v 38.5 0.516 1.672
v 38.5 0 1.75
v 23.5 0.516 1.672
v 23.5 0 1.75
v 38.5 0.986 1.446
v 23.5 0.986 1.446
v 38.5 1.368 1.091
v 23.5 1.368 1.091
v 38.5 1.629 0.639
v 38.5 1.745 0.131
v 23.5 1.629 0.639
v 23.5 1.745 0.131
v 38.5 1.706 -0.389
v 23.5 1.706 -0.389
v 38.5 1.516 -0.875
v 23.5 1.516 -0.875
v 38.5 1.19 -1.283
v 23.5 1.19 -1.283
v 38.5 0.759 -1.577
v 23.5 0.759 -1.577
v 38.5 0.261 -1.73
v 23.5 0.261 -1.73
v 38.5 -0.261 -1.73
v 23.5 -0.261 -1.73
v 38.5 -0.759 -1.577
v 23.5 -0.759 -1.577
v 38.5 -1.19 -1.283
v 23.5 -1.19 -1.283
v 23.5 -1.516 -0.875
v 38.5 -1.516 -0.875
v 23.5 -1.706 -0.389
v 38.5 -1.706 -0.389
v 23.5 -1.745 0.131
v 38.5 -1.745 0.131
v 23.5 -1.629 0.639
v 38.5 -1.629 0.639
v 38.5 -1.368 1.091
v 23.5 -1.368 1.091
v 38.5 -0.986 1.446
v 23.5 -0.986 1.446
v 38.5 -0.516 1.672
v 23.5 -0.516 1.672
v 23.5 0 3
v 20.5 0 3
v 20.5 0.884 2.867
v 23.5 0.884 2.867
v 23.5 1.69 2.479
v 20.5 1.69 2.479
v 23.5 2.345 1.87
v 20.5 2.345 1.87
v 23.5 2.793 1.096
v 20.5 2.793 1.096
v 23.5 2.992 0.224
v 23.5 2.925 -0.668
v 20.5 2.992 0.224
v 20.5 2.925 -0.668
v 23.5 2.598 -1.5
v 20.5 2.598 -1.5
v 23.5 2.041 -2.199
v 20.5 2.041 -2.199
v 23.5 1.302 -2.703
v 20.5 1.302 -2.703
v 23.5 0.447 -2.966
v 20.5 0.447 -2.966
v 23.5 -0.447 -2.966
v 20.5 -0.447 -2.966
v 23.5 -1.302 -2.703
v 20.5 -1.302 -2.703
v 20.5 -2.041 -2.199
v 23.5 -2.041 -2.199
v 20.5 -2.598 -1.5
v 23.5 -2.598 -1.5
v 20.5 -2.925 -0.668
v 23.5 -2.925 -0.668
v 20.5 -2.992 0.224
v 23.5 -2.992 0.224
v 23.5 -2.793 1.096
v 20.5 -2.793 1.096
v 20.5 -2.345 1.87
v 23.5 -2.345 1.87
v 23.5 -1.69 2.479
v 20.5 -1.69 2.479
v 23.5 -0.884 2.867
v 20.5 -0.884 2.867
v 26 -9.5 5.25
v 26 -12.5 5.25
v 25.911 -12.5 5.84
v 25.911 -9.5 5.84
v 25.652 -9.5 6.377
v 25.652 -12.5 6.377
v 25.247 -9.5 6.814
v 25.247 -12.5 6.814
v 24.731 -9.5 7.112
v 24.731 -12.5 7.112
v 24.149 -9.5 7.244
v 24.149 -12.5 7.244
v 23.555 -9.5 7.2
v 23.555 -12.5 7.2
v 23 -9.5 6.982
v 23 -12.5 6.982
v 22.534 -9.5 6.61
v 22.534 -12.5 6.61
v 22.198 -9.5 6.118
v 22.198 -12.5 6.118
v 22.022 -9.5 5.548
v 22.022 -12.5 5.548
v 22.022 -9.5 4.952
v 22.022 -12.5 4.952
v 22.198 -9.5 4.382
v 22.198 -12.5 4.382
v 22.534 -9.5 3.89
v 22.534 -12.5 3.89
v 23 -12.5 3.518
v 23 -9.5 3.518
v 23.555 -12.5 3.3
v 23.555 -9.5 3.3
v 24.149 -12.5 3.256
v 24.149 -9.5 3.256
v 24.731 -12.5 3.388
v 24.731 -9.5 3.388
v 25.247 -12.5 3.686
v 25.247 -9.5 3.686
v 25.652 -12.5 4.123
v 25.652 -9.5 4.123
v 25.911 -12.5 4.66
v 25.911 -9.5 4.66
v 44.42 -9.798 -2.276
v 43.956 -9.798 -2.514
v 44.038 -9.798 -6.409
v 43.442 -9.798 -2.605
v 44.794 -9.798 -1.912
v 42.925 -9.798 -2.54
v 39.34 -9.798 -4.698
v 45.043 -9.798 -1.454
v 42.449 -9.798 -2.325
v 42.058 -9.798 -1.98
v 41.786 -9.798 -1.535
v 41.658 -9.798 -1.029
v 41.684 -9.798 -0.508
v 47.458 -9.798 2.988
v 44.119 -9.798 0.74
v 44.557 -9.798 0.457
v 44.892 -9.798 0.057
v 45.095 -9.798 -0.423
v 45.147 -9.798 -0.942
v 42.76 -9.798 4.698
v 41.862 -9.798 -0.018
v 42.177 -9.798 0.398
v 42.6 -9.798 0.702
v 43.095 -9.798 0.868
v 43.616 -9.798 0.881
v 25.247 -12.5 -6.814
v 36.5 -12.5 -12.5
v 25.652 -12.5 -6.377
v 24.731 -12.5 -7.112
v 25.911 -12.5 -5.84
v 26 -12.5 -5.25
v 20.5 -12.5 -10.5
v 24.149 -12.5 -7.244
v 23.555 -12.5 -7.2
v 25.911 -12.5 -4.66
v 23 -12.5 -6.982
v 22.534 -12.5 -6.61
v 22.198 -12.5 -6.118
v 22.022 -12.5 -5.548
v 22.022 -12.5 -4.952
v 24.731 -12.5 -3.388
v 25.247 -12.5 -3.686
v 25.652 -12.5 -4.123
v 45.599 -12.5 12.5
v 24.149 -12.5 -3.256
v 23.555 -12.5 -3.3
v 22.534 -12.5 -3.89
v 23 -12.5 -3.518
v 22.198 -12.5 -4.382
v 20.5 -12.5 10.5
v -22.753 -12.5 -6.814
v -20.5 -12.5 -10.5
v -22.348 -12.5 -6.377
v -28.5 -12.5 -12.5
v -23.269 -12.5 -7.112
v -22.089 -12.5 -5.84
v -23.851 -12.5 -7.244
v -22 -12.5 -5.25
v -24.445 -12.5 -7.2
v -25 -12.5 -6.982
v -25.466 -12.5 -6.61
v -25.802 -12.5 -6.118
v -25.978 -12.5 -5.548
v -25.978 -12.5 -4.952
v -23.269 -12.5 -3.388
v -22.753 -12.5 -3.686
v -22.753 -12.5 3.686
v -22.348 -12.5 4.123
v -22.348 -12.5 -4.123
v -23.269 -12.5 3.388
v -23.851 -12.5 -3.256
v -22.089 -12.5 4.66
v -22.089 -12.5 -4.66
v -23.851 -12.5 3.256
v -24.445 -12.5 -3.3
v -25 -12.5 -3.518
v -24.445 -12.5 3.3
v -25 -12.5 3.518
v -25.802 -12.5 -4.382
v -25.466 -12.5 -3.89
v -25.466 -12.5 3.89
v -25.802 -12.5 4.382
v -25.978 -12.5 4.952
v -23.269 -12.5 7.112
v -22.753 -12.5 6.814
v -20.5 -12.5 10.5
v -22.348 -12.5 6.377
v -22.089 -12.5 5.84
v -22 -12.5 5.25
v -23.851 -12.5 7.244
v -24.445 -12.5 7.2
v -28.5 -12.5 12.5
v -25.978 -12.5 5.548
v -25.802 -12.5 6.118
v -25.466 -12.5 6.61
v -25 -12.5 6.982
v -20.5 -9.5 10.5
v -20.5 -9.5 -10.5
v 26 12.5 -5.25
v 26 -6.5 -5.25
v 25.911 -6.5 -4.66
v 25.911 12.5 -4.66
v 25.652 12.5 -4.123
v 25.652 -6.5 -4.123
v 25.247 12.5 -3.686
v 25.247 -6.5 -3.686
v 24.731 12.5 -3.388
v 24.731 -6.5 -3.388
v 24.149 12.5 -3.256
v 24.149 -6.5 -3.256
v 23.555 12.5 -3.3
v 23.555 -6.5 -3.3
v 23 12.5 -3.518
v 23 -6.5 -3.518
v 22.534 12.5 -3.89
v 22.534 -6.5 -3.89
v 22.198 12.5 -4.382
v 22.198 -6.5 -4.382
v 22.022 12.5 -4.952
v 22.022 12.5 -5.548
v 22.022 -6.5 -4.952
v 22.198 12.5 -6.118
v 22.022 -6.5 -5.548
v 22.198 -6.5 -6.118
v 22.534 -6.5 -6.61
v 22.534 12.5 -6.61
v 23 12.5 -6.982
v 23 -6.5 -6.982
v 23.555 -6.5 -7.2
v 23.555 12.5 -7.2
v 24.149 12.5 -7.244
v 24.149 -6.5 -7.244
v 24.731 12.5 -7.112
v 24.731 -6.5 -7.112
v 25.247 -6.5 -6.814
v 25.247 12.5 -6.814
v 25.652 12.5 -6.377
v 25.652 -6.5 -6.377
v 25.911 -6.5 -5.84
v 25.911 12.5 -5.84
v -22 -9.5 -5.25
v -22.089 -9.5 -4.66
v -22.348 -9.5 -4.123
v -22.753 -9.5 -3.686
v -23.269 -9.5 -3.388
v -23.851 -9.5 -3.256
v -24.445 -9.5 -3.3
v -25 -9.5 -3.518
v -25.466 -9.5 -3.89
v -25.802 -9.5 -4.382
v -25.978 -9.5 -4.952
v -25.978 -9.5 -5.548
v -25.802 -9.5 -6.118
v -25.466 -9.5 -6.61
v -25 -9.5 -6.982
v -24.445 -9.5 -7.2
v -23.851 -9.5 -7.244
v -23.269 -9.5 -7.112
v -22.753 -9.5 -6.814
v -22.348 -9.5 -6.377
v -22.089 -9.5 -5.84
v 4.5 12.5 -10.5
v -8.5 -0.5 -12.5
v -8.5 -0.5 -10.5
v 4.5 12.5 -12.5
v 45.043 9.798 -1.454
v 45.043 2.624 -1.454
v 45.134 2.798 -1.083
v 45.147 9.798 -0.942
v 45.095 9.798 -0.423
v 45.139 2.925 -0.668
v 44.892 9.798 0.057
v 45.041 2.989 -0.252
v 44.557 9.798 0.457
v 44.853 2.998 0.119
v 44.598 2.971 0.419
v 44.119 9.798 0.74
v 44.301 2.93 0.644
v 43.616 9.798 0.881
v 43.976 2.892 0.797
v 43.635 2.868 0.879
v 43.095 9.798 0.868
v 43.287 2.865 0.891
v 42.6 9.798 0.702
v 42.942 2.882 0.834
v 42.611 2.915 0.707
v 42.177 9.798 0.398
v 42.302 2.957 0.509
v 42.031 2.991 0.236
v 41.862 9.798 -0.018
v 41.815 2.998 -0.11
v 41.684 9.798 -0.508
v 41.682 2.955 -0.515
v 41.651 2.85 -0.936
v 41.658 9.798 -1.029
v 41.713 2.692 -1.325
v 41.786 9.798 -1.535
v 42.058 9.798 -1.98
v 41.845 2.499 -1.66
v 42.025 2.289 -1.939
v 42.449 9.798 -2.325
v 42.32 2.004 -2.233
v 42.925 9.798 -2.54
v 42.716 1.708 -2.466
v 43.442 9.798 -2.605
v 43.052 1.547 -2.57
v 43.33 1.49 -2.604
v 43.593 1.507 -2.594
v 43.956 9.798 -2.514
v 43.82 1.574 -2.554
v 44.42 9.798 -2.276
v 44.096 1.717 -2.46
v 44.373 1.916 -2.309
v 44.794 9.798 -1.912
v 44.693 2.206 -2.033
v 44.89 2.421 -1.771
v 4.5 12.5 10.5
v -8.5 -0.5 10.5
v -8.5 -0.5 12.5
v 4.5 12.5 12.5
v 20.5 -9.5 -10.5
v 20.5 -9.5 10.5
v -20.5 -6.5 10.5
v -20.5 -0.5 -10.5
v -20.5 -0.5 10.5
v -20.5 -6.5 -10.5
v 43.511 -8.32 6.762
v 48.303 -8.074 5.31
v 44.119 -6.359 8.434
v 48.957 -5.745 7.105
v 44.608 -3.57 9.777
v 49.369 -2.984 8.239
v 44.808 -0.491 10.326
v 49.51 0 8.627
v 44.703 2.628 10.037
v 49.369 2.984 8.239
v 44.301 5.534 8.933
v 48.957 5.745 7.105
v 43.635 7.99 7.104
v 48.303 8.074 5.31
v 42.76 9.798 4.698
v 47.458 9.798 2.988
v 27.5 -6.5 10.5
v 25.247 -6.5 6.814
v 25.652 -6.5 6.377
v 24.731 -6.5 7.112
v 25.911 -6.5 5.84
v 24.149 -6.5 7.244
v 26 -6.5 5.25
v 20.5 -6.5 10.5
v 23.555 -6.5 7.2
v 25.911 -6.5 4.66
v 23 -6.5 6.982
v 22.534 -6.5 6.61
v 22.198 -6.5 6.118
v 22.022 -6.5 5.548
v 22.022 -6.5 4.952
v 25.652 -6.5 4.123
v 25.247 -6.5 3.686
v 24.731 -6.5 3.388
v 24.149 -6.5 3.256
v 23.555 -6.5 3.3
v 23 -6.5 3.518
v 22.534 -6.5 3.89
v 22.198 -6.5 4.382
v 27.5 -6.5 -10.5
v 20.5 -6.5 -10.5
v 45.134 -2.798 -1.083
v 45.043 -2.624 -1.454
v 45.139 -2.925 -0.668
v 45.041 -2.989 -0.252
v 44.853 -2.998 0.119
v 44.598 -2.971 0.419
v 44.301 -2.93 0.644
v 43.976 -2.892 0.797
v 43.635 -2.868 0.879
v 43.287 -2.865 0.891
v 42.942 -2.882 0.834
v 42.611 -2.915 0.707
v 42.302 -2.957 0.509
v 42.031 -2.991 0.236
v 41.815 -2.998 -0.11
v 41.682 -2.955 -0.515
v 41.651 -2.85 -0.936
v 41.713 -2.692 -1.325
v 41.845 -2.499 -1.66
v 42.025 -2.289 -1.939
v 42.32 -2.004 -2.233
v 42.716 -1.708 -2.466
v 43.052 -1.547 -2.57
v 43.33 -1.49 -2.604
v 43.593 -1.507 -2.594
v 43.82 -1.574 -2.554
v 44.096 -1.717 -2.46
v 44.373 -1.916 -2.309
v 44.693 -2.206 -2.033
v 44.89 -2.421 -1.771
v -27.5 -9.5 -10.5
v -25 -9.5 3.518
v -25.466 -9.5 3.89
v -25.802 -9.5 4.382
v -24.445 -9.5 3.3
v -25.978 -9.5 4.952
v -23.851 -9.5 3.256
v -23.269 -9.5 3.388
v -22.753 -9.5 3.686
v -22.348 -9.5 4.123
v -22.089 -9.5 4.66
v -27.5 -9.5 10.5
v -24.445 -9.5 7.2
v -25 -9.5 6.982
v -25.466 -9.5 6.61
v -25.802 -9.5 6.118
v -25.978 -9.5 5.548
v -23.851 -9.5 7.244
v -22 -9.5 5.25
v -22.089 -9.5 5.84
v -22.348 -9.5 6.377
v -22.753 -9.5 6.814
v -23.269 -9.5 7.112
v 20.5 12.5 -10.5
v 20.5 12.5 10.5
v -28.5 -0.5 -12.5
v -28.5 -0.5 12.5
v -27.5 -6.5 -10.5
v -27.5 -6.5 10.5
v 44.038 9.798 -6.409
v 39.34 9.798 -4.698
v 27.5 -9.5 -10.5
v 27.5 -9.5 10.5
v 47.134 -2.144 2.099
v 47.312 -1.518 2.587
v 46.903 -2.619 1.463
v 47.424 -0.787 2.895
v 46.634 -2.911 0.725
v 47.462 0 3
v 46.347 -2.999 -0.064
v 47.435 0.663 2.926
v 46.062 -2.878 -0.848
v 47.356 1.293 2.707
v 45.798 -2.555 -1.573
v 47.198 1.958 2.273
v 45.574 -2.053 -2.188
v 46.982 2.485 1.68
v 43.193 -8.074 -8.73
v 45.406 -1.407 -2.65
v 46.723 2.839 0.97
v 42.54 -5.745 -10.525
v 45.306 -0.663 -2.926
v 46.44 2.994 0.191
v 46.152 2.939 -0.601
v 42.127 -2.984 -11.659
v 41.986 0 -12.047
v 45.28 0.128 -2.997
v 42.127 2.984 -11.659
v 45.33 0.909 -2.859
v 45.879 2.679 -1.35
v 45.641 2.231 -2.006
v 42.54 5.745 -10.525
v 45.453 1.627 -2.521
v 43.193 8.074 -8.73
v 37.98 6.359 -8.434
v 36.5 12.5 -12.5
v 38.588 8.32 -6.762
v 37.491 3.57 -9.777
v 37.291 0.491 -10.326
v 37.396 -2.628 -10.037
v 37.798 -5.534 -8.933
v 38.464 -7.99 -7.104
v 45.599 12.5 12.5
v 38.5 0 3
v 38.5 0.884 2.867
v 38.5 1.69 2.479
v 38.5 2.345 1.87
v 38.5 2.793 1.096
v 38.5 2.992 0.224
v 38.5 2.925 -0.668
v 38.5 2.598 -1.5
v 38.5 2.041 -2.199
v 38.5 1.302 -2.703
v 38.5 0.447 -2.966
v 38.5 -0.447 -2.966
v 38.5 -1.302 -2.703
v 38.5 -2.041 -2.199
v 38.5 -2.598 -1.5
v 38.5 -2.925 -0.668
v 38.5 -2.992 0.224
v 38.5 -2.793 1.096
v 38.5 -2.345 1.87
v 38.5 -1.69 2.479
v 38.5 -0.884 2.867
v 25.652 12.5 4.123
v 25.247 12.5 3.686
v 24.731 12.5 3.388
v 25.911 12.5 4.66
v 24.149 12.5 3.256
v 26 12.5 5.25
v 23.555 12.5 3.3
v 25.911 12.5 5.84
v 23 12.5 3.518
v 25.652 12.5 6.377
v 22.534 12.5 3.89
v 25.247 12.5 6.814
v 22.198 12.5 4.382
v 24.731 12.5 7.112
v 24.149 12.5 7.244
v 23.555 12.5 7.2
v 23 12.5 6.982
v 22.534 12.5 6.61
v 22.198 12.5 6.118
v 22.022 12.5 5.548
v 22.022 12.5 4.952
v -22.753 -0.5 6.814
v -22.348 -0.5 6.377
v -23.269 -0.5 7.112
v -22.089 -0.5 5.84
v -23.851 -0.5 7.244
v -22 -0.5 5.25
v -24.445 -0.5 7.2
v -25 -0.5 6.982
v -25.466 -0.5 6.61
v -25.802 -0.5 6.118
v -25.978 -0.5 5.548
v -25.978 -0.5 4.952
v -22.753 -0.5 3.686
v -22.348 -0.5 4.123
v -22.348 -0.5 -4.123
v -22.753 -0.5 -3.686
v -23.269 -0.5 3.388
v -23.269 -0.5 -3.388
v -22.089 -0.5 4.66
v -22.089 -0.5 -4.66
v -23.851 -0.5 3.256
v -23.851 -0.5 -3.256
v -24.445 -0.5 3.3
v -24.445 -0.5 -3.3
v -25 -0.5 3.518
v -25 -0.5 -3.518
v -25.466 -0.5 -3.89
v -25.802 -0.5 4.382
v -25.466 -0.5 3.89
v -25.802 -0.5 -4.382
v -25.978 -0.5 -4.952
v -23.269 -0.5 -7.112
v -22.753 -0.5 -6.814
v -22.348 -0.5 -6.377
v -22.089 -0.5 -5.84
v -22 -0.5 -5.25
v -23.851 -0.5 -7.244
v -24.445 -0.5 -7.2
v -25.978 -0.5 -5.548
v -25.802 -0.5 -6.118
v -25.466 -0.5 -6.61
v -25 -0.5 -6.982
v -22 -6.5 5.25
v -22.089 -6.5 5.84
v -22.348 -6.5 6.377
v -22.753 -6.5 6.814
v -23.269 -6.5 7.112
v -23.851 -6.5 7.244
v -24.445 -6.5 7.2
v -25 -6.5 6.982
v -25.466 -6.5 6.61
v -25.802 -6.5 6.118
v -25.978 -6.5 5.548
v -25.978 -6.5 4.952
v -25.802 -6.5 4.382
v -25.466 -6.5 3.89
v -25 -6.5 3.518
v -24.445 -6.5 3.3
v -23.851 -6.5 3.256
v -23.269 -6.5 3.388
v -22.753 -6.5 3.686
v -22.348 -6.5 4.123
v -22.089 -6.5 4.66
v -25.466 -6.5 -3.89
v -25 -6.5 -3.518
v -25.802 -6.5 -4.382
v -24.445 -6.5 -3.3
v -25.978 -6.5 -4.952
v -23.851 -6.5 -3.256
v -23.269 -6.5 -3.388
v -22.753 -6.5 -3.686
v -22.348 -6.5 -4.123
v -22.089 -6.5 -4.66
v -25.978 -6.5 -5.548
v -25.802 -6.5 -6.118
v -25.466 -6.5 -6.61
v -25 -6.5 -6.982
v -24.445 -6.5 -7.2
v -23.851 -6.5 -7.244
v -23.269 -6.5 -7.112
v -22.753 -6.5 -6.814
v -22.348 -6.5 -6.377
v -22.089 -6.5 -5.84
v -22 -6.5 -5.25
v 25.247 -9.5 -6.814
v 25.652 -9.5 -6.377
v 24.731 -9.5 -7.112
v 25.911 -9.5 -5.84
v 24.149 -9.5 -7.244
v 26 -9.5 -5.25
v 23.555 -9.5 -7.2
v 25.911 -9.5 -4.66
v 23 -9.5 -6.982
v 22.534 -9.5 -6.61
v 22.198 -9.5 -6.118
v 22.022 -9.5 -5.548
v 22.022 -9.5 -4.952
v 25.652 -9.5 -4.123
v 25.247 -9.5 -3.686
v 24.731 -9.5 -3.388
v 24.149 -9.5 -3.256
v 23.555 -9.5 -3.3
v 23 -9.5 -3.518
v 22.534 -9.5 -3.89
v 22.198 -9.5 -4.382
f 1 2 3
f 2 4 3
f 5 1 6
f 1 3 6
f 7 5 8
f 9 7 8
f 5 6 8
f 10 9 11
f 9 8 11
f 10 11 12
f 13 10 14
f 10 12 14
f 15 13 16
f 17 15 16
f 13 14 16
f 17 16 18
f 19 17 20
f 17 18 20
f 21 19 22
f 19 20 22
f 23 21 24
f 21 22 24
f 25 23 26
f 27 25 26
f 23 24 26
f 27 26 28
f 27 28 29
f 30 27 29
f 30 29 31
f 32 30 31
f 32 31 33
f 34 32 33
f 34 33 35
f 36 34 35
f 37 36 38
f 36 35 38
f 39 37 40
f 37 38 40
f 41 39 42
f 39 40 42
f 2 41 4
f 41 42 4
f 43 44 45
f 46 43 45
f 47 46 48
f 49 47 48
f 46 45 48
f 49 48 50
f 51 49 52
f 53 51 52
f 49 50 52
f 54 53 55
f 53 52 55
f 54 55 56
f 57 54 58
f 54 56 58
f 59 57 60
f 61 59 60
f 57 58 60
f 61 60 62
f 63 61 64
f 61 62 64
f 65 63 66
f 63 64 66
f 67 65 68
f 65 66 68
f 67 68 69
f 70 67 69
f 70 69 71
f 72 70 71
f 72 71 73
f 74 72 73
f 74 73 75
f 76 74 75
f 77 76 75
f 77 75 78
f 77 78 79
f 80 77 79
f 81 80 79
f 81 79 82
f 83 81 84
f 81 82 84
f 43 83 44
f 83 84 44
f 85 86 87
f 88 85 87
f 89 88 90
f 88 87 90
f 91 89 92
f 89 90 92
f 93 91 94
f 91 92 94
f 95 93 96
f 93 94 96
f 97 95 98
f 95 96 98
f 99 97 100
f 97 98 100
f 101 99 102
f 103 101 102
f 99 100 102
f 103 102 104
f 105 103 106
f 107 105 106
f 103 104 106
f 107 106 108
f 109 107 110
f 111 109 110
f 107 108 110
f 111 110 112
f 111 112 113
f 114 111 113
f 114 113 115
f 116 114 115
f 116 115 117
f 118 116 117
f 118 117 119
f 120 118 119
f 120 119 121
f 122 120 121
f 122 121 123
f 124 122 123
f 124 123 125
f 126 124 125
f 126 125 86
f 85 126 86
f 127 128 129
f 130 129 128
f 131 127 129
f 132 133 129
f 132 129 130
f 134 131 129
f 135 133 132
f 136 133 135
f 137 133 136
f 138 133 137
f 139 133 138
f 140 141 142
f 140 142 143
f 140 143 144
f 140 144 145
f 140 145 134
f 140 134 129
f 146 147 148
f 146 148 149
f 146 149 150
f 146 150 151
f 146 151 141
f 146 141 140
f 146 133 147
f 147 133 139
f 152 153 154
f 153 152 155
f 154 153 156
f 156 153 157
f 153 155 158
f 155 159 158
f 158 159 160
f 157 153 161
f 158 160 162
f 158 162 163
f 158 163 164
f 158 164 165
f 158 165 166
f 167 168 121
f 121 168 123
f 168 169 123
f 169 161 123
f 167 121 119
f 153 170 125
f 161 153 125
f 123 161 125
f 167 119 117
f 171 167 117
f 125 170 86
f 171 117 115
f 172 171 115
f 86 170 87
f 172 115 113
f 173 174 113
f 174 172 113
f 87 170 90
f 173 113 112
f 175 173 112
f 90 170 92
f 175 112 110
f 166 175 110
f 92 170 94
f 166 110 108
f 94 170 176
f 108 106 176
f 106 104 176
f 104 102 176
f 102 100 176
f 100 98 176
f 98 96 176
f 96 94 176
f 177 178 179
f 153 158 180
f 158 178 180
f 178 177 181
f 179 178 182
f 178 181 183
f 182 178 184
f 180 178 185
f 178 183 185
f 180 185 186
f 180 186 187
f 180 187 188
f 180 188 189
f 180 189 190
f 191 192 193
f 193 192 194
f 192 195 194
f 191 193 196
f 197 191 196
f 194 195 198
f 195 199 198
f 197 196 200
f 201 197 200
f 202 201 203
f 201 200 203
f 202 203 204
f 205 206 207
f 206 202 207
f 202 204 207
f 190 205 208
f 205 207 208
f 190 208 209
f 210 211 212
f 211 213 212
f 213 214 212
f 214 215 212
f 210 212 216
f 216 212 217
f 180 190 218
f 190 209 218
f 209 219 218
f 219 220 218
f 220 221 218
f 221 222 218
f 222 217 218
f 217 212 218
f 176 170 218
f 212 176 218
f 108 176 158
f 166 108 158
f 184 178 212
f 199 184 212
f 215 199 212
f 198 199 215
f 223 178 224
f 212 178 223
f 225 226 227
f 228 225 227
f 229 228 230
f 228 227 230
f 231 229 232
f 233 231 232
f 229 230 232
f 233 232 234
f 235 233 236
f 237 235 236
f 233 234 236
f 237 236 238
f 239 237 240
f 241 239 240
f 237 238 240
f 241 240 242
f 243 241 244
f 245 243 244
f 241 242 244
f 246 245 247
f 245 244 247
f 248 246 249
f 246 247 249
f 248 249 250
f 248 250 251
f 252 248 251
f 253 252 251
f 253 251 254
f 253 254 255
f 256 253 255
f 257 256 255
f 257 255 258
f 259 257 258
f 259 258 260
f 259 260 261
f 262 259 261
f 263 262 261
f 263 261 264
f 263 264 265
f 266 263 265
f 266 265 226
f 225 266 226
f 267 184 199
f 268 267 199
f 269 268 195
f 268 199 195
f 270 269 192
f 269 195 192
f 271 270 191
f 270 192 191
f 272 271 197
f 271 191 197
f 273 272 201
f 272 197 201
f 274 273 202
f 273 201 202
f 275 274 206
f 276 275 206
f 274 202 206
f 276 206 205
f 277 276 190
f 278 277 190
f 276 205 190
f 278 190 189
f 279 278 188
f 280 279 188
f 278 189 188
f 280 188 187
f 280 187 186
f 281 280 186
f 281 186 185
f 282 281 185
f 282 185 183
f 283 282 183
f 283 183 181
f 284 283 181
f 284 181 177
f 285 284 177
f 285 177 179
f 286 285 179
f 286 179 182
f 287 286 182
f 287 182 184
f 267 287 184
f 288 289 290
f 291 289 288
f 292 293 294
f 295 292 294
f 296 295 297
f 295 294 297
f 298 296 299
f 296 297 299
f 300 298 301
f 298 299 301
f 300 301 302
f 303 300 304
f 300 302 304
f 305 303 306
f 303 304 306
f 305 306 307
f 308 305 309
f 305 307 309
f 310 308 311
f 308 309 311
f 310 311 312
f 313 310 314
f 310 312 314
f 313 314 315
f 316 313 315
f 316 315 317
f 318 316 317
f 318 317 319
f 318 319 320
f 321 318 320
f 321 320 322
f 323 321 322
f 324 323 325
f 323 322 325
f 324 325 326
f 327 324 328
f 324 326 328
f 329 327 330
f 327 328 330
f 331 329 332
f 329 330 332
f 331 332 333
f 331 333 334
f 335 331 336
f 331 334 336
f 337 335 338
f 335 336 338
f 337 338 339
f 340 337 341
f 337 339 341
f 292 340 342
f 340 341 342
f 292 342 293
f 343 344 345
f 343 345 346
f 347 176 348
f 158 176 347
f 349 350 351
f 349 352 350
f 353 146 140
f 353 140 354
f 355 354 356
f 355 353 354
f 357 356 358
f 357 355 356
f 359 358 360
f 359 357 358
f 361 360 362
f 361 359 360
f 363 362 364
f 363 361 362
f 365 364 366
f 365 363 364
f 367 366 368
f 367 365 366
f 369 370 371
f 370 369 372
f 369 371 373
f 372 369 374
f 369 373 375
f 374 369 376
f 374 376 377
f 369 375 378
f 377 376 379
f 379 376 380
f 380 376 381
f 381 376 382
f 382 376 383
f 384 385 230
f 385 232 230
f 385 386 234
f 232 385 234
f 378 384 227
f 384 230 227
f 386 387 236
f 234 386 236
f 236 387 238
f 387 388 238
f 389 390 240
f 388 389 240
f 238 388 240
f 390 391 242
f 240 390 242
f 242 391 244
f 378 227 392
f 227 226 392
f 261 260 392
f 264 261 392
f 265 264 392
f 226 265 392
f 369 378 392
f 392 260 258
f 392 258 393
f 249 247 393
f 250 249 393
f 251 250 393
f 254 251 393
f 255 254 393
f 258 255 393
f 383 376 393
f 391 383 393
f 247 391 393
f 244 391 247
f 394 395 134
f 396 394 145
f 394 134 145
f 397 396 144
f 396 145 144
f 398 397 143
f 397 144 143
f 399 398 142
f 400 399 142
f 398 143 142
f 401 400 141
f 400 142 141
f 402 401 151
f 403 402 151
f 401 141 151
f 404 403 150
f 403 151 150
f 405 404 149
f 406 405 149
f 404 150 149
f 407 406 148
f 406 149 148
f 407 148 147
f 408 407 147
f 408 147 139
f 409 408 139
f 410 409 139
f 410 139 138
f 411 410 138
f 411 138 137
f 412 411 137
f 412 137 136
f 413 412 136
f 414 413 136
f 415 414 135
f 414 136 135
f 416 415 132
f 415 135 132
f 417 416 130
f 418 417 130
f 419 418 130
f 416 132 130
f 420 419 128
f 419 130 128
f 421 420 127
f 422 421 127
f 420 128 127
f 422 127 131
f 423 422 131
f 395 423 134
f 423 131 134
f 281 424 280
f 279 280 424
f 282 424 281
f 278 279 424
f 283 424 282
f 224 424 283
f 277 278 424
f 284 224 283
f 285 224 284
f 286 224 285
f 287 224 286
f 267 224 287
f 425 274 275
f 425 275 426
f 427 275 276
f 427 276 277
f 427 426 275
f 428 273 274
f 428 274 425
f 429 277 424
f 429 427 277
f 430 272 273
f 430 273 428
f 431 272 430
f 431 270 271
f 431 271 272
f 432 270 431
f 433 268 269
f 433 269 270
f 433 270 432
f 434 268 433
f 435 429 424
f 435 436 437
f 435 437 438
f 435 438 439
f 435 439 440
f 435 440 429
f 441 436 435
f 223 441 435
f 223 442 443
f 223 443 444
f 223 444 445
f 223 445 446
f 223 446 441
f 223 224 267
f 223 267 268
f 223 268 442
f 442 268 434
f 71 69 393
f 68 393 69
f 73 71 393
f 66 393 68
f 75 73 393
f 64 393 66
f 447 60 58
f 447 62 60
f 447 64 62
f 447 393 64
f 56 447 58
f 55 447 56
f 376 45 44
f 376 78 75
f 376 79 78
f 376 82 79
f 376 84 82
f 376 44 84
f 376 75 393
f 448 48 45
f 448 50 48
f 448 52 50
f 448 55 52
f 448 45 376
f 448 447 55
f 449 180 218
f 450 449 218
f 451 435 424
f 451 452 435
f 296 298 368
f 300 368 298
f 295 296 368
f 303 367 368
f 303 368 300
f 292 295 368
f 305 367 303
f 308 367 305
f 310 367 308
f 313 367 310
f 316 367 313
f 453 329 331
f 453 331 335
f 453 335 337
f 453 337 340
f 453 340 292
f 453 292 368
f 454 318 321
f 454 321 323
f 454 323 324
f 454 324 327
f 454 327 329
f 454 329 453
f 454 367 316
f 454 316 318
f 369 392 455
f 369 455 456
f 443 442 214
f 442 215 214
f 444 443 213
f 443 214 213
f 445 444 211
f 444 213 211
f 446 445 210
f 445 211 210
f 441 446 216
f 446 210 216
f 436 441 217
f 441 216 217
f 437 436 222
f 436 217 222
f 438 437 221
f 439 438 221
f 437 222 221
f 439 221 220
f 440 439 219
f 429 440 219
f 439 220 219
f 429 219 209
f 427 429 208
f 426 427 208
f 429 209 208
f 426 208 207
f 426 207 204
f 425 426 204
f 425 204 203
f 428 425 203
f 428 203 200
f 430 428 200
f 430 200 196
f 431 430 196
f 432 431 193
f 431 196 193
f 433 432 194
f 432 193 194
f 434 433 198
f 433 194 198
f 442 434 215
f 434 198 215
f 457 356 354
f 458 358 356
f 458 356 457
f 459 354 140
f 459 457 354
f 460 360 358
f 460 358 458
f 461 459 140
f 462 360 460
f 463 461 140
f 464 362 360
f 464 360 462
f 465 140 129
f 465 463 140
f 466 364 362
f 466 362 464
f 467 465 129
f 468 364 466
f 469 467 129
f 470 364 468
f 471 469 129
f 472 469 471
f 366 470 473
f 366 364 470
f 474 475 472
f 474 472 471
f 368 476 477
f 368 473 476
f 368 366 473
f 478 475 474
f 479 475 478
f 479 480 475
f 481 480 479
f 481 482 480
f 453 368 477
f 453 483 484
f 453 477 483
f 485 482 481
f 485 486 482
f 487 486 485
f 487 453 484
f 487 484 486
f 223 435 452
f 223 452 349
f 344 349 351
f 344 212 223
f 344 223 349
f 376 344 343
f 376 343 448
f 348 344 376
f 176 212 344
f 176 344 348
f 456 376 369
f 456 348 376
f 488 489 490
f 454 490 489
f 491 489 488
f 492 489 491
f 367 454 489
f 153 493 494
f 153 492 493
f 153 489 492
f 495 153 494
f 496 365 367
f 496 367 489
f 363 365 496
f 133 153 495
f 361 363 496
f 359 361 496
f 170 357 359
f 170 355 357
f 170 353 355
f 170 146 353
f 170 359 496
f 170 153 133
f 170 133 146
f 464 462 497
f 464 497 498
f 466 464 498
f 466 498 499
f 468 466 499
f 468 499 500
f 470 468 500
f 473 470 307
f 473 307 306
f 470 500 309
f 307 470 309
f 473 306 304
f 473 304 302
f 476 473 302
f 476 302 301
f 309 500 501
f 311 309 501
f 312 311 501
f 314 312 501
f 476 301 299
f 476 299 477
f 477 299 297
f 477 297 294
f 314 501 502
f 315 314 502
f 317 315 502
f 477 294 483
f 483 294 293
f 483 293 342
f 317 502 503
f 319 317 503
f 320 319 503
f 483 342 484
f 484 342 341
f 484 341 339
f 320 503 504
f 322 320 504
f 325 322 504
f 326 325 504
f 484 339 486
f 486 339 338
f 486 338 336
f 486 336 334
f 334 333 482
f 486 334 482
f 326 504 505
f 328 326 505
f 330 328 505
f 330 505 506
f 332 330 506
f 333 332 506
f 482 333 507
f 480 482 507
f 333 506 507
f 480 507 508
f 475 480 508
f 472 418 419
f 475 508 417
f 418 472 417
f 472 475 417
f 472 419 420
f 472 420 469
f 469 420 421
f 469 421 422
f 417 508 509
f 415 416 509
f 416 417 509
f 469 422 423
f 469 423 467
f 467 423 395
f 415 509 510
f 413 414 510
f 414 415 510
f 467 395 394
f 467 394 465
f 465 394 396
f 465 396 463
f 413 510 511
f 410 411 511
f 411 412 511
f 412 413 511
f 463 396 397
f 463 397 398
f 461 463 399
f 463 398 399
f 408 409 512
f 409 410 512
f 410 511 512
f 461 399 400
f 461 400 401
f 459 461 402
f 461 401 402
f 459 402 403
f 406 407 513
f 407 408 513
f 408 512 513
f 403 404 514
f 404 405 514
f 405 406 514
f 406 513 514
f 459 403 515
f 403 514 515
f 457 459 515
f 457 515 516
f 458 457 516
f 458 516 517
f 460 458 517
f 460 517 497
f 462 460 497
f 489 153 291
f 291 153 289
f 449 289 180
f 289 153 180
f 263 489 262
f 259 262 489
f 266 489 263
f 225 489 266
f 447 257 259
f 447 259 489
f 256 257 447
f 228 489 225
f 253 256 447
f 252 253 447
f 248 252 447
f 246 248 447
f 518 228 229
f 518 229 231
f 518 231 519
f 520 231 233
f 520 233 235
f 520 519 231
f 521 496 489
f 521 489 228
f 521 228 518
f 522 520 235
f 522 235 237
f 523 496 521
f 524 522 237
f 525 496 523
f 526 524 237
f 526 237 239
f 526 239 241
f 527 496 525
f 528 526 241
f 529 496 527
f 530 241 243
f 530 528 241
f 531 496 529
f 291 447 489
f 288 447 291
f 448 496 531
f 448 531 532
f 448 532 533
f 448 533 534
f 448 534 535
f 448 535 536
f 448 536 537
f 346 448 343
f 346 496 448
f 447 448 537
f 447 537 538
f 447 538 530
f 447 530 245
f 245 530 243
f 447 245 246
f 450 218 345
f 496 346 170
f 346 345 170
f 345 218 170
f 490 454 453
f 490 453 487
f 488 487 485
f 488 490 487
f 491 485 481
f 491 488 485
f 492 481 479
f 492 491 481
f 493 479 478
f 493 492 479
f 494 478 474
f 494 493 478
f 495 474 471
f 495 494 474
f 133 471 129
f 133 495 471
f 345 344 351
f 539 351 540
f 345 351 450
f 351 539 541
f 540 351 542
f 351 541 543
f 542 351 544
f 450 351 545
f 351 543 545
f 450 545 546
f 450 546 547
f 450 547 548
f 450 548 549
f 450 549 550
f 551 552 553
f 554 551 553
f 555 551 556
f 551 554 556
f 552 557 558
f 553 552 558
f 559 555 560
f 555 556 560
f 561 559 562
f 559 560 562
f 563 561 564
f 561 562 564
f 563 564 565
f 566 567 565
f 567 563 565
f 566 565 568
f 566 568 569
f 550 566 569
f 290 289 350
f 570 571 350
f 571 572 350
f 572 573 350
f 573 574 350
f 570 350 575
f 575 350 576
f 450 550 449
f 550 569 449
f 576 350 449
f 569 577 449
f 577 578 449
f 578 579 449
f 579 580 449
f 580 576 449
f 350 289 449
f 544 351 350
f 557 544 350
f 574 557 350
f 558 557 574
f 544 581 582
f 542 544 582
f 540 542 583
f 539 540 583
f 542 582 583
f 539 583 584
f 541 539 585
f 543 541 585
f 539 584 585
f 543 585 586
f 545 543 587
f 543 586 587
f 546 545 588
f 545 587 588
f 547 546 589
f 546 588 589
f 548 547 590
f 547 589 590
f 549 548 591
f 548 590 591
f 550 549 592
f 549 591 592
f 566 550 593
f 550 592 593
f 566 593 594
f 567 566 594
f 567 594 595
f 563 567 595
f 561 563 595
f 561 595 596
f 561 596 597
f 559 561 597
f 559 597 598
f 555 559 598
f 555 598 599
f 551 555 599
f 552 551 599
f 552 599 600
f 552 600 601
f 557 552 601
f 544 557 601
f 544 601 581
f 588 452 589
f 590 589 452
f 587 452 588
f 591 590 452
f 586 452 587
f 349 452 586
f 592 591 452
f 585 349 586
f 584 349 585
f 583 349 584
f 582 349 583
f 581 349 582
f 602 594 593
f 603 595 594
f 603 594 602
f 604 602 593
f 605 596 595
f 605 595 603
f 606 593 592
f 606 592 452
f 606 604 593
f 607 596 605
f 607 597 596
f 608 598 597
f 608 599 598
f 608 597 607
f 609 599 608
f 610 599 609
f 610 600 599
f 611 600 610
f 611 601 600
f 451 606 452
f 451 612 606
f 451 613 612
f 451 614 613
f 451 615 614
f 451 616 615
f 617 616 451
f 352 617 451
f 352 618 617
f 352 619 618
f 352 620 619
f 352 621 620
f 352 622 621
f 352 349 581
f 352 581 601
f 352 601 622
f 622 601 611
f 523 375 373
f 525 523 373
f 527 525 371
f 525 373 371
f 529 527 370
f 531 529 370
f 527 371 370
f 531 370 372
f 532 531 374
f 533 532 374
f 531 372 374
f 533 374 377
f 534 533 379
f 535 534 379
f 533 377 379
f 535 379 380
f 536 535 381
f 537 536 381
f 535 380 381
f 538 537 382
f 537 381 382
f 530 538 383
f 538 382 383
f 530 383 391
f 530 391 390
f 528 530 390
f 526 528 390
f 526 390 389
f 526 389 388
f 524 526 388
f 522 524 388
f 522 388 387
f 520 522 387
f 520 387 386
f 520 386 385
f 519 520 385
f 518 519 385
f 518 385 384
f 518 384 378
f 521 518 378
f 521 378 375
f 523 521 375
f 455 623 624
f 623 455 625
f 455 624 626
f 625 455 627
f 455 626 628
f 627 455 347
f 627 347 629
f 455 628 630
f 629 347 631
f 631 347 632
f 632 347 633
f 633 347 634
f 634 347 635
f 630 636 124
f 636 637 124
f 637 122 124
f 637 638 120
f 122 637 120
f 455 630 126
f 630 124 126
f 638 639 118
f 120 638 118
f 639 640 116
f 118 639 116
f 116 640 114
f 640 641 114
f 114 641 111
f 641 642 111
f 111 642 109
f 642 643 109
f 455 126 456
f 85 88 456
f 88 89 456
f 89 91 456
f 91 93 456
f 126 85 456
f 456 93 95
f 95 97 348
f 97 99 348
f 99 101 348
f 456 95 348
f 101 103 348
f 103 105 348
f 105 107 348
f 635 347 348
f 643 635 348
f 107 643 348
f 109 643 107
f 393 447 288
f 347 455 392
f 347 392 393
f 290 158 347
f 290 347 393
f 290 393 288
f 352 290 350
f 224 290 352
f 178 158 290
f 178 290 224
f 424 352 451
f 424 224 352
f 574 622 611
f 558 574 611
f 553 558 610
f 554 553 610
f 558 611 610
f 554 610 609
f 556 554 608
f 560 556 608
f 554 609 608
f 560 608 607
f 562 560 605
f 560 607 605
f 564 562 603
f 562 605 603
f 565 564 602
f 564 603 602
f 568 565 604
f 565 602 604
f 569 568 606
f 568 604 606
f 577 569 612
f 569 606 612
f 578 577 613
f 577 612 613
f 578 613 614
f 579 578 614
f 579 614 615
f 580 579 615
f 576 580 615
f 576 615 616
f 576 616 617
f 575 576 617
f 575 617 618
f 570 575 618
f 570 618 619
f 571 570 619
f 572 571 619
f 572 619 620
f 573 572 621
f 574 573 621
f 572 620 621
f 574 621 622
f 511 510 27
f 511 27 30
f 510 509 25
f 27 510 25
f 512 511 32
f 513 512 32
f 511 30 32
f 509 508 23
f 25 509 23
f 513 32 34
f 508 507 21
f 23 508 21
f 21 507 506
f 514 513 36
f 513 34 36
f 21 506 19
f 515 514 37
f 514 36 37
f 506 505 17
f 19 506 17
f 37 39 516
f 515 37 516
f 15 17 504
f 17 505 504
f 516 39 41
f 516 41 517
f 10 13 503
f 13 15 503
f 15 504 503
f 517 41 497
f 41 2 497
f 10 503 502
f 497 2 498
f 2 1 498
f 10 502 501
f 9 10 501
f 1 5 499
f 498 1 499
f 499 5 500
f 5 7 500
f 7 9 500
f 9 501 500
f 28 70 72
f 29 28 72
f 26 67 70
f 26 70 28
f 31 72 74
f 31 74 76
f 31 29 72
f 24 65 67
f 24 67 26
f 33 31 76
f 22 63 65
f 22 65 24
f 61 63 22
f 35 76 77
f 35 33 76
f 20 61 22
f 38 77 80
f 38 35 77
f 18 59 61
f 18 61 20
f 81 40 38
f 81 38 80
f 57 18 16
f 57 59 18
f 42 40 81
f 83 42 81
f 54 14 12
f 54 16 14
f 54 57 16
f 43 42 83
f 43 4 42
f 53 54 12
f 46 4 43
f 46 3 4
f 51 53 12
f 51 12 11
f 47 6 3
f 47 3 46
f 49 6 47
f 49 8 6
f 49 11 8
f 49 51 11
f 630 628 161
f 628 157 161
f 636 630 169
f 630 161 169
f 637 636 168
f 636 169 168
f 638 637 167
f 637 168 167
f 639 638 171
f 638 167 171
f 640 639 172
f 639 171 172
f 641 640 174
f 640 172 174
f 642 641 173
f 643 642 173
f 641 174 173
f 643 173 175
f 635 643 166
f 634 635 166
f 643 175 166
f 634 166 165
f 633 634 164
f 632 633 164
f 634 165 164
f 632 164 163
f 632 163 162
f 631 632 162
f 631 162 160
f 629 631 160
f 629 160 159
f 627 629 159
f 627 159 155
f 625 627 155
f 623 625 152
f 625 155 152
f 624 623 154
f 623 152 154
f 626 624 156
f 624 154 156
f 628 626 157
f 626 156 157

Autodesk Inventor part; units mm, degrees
ref_plane "YZ Plane" through (0, 0, 0) normal (1, 0, 0) x (0, 1, 0)
ref_plane "XZ Plane" through (0, 0, 0) normal (0, 1, 0) x (-1, 0, 0)
ref_plane "XY Plane" through (0, 0, 0) normal (0, 0, 1) x (1, 0, 0)
sketch "Esquisse1" plane through (0, 0, 0) normal (0, 1, 0) x (-1, 0, 0)
  line L0 (20.5, 10.5) -> (-20.5, 10.5)
  line L1 (-20.5, 10.5) -> (-20.5, -10.5)
  line L2 (-20.5, -10.5) -> (20.5, -10.5)
  line L3 (20.5, -10.5) -> (20.5, 10.5)
  line L4 (28.5, 12.5) -> (-36.5, 12.5)
  line L5 (-36.5, 12.5) -> (-36.5, -12.5)
  line L6 (-36.5, -12.5) -> (28.5, -12.5)
  line L7 (28.5, -12.5) -> (28.5, 12.5)
  line L8 (-36.5, -12.5) -> (-45.5993, 12.5)
  line L9 (-45.5993, 12.5) -> (-36.5, 12.5)
  point P0 (0, 0)
  dimension "d0" = 20
  dimension "d1" = 41
  dimension "d2" = 21
  dimension "d3" = 10.5
  dimension "d4" = 20.5
  dimension "d5" = 8
  dimension "d6" = 2
  dimension "d7" = 2
  dimension "d8" = 16
extrude "Extrusion1" add sketch "Esquisse1" along normal mid plane 25
sketch "Esquisse2" plane through (36.5, -12.5, -12.5) normal (0.9397, 0, -0.342) x (-0.342, 0, -0.9397)
  line L0 (-26.6044, 25) -> (0, 0)
  line L1 (0, 0) -> (0, 25)
  line L2 (0, 25) -> (-26.6044, 0)
  arc A0 (-8.3022, 22.298) -> (-18.3022, 22.298) centre (-13.3022, 12.5) ccw
  line L3 (-18.3022, 22.298) -> (-8.3022, 22.298)
  line L4 (-8.3022, 22.298) -> (-8.3022, 2.702)
  line L5 (-8.3022, 2.702) -> (-18.3022, 2.702)
  line L6 (-18.3022, 2.702) -> (-18.3022, 22.298)
  arc A1 (-8.3022, 2.702) -> (-8.3022, 22.298) centre (-13.3022, 12.5) ccw
  arc A2 (-18.3022, 2.702) -> (-8.3022, 2.702) centre (-13.3022, 12.5) ccw
  arc A3 (-18.3022, 22.298) -> (-18.3022, 2.702) centre (-13.3022, 12.5) ccw
  point P0 (0.7376, 12.5)
  dimension "d11" = 22
  dimension "d13" = 10
extrude "Extrusion2" add sketch "Esquisse2" along normal blind 5 contours A3 L6 L0 | L0 L6 L2 A3 | L6 L3 L4 L2 L0 | L0 L2 L6 | L2 L6 A3 | L2 L4 L0 | L0 L4 L5 L6 L2 | A1 L2 L4 | L4 L2 A1 L0 | L0 A1 L4
sketch "Esquisse3" plane through (39.3395, -9.798, -4.6985) normal (0, -1, 0) x (0.9397, 0, -0.342)
  line L0 (5, 10) -> (0, 0)
  line L1 (0, 10) -> (5, 0)
  circle A0 centre (2.5, 5) radius 1.75
  point P0 (-38.574, -9.0398)
  dimension "d16" = 3.5
extrude "Extrusion3" cut sketch "Esquisse3" against normal through all
sketch "Esquisse4" plane through (20.5, -12.5, 10.5) normal (-1, 0, 0) x (0, 0, 1)
  line L0 (-21, 3) -> (0, 3)
  line L1 (0, 3) -> (0, 6)
  line L2 (0, 6) -> (-21, 6)
  line L3 (-21, 6) -> (-21, 3)
  line L4 (-21, 0) -> (-21, 25) projected
  line L5 (0, 0) -> (0, 25) projected
  line L6 (0, 0) -> (-21, 0) projected
  point P0 (-10.5, 12.5)
  dimension "d19" = 3
  dimension "d20" = 3
extrude "Extrusion4" cut sketch "Esquisse4" against normal blind 7 contours L3 L2 L1 L0
sketch "Esquisse5" plane through (-20.5, -12.5, -10.5) normal (1, 0, 0) x (0, 0, -1)
  line L0 (-21, 6) -> (0, 6)
  line L1 (0, 6) -> (0, 3)
  line L2 (0, 3) -> (-21, 3)
  line L3 (-21, 3) -> (-21, 6)
  line L4 (-21, 25) -> (-21, 0) projected
  line L5 (0, 0) -> (0, 25) projected
  line L6 (0, 0) -> (-21, 0) projected
  point P0 (-10.5, 12.5)
  dimension "d23" = 3
  dimension "d24" = 3
extrude "Extrusion5" cut sketch "Esquisse5" against normal blind 7 contours L0 L1 L2 L3
sketch "Esquisse6" plane through (20.5, 12.5, -10.5) normal (-1, 0, 0) x (0, 0, 1)
  line L0 (21, -25) -> (0, 0)
  line L1 (0, -25) -> (21, 0)
  circle A0 centre (10.5, -12.5) radius 3
  dimension "d27" = 6
extrude "Extrusion6" cut sketch "Esquisse6" against normal through all
sketch "Esquisse7" plane through (20.5, 12.5, -10.5) normal (-1, 0, 0) x (0, 0, 1)
  circle A0 centre (10.5, -12.5) radius 3
  circle A1 centre (10.5, -12.5) radius 1.75
  circle A2 centre (10.5, -12.5) radius 3 projected
  dimension "d30" = 0
  dimension "d31" = 3.5
extrude "Extrusion7" add sketch "Esquisse7" against normal blind 18
sketch "Esquisse8" plane through (20.5, 12.5, -10.5) normal (-1, 0, 0) x (0, 0, 1)
  circle A0 centre (10.5, -12.5) radius 3
  dimension "d34" = 6
extrude "Extrusion8" cut sketch "Esquisse8" against normal blind 3
sketch "Esquisse10" plane through (0, -12.5, 0) normal (0, -1, 0) x (1, 0, 0)
  line L0 (-20.5, -10.5) -> (-27.5, -10.5)
  line L1 (-27.5, -10.5) -> (-27.5, 10.5)
  line L2 (-27.5, 10.5) -> (-20.5, 10.5)
  line L3 (-20.5, 10.5) -> (-20.5, -10.5)
  line L4 (20.5, -10.5) -> (27.5, -10.5)
  line L5 (27.5, -10.5) -> (27.5, 10.5)
  line L6 (27.5, 10.5) -> (20.5, 10.5)
  line L7 (20.5, 10.5) -> (20.5, -10.5)
  line L8 (-27.5, -10.5) -> (-27.5, 10.5) projected
  line L9 (27.5, 10.5) -> (27.5, -10.5) projected
  line L10 (-27.5, -10.5) -> (-20.5, 0)
  line L11 (-20.5, 0) -> (-27.5, 10.5)
  line L12 (-27.5, 0) -> (-20.5, 10.5)
  line L13 (-20.5, -10.5) -> (-27.5, 0)
  line L14 (20.5, -10.5) -> (27.5, 0)
  line L15 (20.5, 0) -> (27.5, -10.5)
  line L16 (27.5, 10.5) -> (20.5, 0)
  line L17 (20.5, 10.5) -> (27.5, 0)
  circle A0 centre (-24, -5.25) radius 2
  circle A1 centre (24, -5.25) radius 2
  circle A2 centre (24, 5.25) radius 2
  circle A3 centre (-24, 5.25) radius 2
  point P0 (0, 0)
  dimension "d37" = 4
  dimension "d38" = 4
  dimension "d39" = 4
  dimension "d40" = 4
extrude "Extrusion9" cut sketch "Esquisse10" against normal through all contours A0 L10 L13 | L13 L10 A0 | A0 L13 L10 | L10 L13 A0 | A3 L12 L11 | L11 L12 A3 | A3 L11 L12 | L12 L11 A3 | A1 L15 L14 | L14 L15 A1 | L15 L14 A1 | A1 L14 L15 | A2 L17 L16 | L16 L17 A2 | L17 L16 A2 | A2 L16 L17
sketch "Esquisse11" plane through (36.5, 12.5, -12.5) normal (0, 0, -1) x (-1, 0, 0)
  line L0 (65, 0) -> (45, 0)
  line L1 (45, 0) -> (45, -13)
  line L2 (45, -13) -> (65, -13)
  line L3 (65, -13) -> (65, 0)
  line L4 (65, -25) -> (0, -25) projected
  line L5 (45, -13) -> (32, 0)
  line L6 (0, 0) -> (65, 0) projected
  line L7 (45, 0) -> (32, 0)
  point P0 (36.5, -12.5)
  dimension "d43" = 20
  dimension "d44" = 12
  dimension "d45" = 45
extrude "Extrusion10" cut sketch "Esquisse11" against normal through all
equation "\"d3\" = 0.5 * d2"
equation "\"d4\" = 0.5 * d1"
equation "\"d38\" = d37"
equation "\"d39\" = d37"
equation "\"d40\" = d37"
properties part number "forearm"
